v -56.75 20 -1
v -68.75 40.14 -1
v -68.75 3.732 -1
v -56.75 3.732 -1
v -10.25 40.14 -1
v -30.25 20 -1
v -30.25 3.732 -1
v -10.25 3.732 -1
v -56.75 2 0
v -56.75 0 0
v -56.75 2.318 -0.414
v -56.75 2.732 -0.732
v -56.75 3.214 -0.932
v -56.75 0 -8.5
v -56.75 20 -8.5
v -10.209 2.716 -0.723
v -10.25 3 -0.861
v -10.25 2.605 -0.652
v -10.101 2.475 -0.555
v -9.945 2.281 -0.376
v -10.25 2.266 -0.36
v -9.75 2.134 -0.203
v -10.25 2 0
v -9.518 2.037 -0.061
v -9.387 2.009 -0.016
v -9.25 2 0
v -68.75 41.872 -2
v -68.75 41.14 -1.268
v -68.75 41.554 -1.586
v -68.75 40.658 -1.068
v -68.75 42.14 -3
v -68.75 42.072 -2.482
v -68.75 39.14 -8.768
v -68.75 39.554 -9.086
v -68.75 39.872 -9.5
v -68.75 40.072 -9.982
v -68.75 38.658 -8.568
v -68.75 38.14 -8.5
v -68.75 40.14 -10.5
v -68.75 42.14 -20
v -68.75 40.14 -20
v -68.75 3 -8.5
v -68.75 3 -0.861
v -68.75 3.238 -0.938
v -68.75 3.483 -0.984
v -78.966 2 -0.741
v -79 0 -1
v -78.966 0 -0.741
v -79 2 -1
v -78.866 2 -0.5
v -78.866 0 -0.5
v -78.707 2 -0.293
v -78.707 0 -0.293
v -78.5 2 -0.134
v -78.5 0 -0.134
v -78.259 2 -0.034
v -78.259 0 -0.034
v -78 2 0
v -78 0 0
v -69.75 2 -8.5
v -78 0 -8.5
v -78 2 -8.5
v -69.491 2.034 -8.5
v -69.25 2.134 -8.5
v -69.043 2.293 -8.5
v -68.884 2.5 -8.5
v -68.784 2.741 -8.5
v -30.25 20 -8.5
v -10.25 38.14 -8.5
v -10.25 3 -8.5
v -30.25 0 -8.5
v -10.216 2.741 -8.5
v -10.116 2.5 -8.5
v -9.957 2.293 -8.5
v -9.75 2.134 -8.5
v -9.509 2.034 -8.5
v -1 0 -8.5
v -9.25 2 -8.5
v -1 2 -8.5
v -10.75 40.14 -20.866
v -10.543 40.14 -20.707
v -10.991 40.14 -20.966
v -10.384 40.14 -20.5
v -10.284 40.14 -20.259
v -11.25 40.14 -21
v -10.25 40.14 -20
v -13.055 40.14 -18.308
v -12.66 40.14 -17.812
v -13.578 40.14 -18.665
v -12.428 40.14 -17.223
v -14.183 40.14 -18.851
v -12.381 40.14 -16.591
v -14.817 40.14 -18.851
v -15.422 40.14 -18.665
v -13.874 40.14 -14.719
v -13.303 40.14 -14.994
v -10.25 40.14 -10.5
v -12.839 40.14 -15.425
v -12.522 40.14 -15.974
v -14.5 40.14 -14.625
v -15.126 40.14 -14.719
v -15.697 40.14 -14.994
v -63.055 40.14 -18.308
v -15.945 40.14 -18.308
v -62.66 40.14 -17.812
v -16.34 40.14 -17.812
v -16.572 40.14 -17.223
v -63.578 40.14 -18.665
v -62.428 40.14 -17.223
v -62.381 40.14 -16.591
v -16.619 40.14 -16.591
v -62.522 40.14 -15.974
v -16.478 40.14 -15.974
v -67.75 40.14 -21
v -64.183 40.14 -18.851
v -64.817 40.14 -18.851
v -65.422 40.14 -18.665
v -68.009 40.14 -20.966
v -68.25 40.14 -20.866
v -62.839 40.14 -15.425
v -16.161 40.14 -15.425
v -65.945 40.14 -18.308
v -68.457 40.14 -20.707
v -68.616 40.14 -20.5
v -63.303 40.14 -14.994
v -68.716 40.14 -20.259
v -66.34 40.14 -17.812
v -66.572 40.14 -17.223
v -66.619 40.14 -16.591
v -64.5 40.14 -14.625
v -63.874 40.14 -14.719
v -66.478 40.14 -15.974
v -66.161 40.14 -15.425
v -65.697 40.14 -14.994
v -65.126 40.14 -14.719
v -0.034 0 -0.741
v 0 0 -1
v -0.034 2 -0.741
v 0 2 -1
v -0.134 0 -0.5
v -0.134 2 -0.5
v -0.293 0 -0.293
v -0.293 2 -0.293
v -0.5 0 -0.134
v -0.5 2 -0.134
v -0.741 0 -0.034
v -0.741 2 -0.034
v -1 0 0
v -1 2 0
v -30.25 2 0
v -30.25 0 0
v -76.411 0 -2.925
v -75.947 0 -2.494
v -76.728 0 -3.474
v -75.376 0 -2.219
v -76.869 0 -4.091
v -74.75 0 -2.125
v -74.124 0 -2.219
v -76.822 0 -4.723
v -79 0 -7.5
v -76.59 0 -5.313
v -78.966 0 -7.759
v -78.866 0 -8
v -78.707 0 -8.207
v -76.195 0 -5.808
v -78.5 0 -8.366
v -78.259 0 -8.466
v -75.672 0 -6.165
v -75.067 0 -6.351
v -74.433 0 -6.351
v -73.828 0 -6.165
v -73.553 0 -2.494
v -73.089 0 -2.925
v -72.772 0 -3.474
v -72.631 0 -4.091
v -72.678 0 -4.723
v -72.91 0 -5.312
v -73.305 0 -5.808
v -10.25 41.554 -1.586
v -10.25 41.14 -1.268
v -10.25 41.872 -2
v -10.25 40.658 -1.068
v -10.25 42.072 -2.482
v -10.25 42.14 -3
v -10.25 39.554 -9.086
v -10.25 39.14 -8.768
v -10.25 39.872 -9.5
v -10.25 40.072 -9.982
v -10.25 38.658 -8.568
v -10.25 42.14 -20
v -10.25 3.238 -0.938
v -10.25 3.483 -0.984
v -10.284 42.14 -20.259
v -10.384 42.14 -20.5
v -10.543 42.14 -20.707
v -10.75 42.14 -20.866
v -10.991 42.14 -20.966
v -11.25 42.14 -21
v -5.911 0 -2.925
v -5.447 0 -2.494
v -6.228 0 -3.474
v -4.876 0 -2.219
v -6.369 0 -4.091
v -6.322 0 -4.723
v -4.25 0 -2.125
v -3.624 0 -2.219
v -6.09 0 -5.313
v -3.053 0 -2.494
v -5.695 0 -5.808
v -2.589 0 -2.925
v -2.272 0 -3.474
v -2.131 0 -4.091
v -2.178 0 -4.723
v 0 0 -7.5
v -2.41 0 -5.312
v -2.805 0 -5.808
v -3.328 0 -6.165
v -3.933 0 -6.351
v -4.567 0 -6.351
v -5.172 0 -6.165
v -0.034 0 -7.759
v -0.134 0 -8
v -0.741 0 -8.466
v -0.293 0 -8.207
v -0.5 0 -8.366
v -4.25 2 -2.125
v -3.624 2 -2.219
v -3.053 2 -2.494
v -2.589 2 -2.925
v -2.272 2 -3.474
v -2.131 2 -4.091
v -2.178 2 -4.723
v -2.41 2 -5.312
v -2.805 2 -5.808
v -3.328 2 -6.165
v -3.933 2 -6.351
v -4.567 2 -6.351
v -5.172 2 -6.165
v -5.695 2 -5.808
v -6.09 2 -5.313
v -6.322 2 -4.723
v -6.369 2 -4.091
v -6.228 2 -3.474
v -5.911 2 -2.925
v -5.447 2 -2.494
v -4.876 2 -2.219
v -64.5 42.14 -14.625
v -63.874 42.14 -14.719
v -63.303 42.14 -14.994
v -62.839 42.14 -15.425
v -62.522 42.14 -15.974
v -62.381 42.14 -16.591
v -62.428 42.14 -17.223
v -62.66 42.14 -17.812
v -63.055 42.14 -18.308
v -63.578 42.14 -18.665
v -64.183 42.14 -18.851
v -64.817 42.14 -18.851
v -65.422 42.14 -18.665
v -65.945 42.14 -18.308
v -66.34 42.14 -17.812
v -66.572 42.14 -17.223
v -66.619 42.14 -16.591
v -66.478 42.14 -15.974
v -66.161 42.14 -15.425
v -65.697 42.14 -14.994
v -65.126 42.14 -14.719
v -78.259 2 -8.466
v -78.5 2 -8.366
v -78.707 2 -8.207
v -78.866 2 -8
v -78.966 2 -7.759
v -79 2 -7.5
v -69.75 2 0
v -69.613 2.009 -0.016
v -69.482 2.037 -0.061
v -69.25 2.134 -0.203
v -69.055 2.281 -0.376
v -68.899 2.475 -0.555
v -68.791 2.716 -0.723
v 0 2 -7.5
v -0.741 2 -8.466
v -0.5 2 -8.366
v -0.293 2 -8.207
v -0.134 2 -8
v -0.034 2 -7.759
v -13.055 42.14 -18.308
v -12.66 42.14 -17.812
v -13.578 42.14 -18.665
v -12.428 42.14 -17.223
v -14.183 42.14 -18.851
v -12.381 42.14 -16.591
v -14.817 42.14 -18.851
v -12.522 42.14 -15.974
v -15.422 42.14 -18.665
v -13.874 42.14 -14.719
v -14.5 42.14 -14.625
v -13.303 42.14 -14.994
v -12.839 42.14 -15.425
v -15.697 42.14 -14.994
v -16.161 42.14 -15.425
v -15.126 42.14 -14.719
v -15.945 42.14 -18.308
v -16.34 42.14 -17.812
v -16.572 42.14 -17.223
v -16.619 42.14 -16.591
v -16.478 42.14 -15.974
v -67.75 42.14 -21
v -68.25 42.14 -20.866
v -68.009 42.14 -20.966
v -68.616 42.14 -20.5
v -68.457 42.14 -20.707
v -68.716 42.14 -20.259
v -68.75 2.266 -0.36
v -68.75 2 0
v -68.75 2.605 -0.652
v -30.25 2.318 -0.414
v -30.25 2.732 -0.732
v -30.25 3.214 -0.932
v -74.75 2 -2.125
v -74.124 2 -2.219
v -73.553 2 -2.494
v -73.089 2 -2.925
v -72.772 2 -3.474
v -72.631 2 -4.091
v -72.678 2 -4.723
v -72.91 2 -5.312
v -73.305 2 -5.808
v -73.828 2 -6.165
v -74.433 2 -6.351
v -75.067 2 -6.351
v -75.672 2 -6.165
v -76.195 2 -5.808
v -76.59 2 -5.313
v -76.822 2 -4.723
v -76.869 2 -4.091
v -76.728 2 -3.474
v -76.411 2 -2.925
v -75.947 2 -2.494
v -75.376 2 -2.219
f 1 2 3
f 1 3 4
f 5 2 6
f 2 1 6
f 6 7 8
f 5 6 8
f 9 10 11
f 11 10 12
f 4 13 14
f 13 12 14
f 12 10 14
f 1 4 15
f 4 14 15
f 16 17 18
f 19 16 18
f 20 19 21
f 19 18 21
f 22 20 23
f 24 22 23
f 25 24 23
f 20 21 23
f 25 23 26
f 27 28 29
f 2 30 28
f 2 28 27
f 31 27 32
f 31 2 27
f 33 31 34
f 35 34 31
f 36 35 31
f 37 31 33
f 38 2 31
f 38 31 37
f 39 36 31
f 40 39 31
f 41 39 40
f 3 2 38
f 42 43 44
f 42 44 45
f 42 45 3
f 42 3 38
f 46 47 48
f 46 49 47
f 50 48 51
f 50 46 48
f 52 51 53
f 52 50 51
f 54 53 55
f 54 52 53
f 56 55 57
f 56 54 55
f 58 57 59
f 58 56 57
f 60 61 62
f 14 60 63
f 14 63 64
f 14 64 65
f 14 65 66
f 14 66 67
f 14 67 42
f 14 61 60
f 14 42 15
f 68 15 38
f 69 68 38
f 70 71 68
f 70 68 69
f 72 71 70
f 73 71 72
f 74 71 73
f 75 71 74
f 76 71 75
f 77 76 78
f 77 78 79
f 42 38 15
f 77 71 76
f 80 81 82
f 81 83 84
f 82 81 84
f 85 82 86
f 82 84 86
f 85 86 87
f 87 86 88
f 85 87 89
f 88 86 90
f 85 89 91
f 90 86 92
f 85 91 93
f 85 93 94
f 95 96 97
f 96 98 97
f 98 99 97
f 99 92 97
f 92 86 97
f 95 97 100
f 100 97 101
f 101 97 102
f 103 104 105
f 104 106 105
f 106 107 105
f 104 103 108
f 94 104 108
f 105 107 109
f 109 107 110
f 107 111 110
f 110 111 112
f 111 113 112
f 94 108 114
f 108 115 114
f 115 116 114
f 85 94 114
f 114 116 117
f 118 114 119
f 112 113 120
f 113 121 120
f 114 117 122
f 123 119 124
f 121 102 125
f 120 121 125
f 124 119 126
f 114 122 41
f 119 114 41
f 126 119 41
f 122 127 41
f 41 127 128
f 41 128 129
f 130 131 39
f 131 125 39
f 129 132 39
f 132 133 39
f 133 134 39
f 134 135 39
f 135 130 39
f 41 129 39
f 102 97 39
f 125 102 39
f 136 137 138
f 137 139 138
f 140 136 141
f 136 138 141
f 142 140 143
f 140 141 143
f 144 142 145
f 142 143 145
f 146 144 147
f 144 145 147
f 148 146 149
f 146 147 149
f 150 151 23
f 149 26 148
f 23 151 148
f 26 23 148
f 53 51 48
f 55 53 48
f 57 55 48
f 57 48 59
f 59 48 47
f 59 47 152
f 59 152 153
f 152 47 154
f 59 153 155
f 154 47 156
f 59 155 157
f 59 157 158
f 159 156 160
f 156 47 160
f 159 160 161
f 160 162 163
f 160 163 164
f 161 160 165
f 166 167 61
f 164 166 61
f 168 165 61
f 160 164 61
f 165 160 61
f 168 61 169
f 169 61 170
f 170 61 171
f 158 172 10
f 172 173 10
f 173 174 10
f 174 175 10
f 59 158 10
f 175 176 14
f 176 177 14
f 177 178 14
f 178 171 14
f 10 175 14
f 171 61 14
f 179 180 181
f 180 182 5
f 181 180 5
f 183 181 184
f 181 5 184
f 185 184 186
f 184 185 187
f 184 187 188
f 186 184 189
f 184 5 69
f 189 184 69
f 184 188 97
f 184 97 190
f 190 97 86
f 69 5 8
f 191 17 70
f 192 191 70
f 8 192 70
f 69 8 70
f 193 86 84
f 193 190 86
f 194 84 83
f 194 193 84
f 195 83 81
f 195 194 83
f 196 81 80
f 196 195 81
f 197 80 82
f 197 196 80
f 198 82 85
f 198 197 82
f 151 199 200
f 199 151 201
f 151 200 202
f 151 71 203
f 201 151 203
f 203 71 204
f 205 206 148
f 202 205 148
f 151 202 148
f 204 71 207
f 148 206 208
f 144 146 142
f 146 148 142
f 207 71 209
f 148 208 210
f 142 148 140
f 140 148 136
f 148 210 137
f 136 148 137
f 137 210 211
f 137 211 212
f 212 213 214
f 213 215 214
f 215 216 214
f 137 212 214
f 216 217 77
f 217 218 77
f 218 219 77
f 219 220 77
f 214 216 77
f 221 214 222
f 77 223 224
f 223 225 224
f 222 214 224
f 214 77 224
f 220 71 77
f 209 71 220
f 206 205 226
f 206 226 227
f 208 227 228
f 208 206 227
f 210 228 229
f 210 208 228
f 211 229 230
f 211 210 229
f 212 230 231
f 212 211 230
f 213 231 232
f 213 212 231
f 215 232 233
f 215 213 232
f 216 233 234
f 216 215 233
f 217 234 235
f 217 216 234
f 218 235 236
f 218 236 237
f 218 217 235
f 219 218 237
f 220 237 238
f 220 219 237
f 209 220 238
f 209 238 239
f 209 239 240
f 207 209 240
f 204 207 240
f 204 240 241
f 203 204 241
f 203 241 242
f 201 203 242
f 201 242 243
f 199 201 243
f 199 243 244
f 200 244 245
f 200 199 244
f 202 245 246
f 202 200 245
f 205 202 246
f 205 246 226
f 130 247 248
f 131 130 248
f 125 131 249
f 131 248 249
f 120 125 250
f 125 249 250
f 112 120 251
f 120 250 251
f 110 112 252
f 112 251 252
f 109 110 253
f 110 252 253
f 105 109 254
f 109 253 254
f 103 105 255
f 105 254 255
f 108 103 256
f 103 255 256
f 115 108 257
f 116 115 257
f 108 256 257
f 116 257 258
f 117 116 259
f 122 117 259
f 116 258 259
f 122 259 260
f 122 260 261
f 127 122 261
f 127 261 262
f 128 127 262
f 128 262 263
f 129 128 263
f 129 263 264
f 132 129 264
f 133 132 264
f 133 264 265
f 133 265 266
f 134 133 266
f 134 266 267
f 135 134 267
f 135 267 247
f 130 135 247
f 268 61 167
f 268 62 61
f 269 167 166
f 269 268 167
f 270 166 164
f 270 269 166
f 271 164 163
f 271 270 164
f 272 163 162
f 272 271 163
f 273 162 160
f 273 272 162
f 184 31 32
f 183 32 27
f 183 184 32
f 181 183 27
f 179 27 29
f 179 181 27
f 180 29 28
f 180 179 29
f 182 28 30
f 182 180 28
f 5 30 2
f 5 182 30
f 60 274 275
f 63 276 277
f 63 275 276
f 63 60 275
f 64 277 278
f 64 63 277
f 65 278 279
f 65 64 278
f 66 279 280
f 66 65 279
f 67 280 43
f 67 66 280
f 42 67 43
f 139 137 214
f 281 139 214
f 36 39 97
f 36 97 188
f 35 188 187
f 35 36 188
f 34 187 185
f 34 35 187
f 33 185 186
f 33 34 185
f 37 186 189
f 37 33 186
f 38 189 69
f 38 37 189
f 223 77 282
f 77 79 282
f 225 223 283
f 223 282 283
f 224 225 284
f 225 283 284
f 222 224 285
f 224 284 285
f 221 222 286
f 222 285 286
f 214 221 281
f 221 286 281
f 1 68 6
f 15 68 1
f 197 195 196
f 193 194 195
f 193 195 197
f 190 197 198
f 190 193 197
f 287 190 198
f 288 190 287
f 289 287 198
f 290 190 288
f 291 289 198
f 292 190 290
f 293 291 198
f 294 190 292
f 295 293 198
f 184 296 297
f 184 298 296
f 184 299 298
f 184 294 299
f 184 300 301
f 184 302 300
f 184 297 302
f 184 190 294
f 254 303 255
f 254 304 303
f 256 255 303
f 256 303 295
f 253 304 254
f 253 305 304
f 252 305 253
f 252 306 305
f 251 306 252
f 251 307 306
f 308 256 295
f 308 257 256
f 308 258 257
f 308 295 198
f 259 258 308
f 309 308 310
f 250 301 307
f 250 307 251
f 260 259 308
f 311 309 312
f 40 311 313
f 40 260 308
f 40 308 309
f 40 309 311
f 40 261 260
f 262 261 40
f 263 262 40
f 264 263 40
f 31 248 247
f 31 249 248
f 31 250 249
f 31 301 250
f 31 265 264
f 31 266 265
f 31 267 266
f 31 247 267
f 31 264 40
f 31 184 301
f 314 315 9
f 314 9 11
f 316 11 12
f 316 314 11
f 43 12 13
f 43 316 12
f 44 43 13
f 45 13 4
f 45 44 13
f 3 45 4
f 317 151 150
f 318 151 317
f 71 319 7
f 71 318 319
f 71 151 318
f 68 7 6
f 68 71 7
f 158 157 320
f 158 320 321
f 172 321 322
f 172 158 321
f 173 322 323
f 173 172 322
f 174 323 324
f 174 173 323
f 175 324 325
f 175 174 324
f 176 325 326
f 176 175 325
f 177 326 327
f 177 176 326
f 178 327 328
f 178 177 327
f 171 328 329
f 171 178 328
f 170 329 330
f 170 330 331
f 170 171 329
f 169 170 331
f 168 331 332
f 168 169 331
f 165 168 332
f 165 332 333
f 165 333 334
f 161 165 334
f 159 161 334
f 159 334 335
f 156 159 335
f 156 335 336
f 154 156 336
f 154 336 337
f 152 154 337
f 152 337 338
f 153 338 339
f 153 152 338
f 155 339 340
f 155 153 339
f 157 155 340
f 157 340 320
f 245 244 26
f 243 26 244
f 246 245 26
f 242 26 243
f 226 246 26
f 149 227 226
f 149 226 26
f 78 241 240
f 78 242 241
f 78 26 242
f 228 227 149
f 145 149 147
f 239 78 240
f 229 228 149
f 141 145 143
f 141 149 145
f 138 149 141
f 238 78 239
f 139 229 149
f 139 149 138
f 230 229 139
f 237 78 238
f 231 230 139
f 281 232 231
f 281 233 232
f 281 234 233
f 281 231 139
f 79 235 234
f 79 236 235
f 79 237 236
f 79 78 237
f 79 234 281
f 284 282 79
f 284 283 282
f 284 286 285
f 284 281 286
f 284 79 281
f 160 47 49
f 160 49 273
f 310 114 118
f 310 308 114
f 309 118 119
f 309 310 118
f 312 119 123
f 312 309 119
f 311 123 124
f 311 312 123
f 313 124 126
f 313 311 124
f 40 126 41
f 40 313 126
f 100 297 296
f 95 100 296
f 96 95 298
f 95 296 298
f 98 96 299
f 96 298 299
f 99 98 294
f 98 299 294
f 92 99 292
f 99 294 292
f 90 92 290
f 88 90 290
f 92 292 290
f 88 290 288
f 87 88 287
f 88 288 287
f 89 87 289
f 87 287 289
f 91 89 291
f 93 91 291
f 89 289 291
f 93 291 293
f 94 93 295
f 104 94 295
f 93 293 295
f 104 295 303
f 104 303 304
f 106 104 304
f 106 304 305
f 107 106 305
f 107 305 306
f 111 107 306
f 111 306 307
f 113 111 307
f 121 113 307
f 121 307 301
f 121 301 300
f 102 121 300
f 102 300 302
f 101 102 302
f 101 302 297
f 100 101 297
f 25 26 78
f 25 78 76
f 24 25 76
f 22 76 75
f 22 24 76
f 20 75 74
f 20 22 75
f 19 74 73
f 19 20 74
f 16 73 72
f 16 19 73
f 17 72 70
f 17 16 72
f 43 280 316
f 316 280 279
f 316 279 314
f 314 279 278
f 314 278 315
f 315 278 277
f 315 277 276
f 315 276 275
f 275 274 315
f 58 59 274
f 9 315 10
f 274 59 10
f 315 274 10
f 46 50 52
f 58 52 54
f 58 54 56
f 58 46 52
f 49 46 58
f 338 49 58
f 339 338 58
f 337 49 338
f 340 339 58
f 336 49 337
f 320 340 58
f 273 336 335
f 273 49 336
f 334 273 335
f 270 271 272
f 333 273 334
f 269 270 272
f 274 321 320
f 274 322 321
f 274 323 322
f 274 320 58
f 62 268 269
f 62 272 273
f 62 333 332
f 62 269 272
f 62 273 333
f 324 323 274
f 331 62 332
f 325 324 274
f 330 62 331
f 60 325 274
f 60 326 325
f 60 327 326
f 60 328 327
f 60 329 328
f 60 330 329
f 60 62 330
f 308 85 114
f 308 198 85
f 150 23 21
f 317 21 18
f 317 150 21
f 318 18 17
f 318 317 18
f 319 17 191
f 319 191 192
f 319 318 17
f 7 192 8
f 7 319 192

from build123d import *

# Parameters (mm, degrees)
SKETCH1_W           = 79
SKETCH1_H           = 8.5
SKETCH1_R           = 2.125
BOSS_EXTRUDE1_DEPTH = 2
SKETCH3_W           = 58.5
SKETCH3_H           = 7.5
BOSS_EXTRUDE2_DEPTH = 40.14
SKETCH4_W           = 58.5
SKETCH4_H           = 2
BOSS_EXTRUDE3_DEPTH = 12.5
CUT_EXTRUDE1_REACH  = 93.966
SKETCH5_R           = 2.125
FILLET1_R           = 2
FILLET2_R           = 1
FILLET3_R           = 2
FILLET4_R           = 1
FILLET5_R           = 1
SKETCH6_W           = 26.5
SKETCH6_H           = 20
CUT_EXTRUDE2_DEPTH  = 10


with BuildPart() as part:
    # Sketch1 → Boss-Extrude1 (new body)
    with BuildSketch(Plane(origin=(0, 0, 0), x_dir=(1, 0, 0), z_dir=(0, 1, 0))):
        with Locations((-39.5, 4.25)):
            Rectangle(SKETCH1_W, SKETCH1_H)
        with Locations(Location((-74.75, 4.25, 0), (0, 0, 270))):
            Circle(SKETCH1_R, mode=Mode.SUBTRACT)
        with Locations(Location((-4.25, 4.25, 0), (0, 0, 270))):
            Circle(SKETCH1_R, mode=Mode.SUBTRACT)
    extrude(amount=BOSS_EXTRUDE1_DEPTH)

    # Sketch3 → Boss-Extrude2 (add)
    with BuildSketch(Plane(origin=(0, 2, 0), x_dir=(1, 0, 0), z_dir=(0, 1, 0))):
        with Locations((-39.5, 4.75)):
            Rectangle(SKETCH3_W, SKETCH3_H)
    extrude(amount=BOSS_EXTRUDE2_DEPTH)

    # Sketch4 → Boss-Extrude3 (add)
    with BuildSketch(Plane(origin=(0, 0, -8.5), x_dir=(-1, 0, 0), z_dir=(0, 0, -1))):
        with Locations((39.5, 41.14)):
            Rectangle(SKETCH4_W, SKETCH4_H)
    extrude(amount=BOSS_EXTRUDE3_DEPTH)

    # Sketch5 → Cut-Extrude1 (cut, up to next)
    with BuildSketch(Plane(origin=(0, 42.14, 0), x_dir=(1, 0, 0), z_dir=(0, 1, 0)), mode=Mode.PRIVATE) as cut_extrude1_sk1:
        with Locations(Location((-14.5, 16.75, 0), (0, 0, 270))):
            Circle(SKETCH5_R)
    cut_extrude1_tool1 = extrude(cut_extrude1_sk1.sketch, amount=-CUT_EXTRUDE1_REACH, mode=Mode.PRIVATE) & part.part
    # Sketch5 → Cut-Extrude1 (cut, up to next)
    with BuildSketch(Plane(origin=(0, 42.14, 0), x_dir=(1, 0, 0), z_dir=(0, 1, 0)), mode=Mode.PRIVATE) as cut_extrude1_sk2:
        with Locations(Location((-64.5, 16.75, 0), (0, 0, 270))):
            Circle(SKETCH5_R)
    cut_extrude1_tool2 = extrude(cut_extrude1_sk2.sketch, amount=-CUT_EXTRUDE1_REACH, mode=Mode.PRIVATE) & part.part
    add(cut_extrude1_tool1.solids().sort_by_distance((-14.5, 42.14, -16.75))[0], mode=Mode.SUBTRACT)
    add(cut_extrude1_tool2.solids().sort_by_distance((-64.5, 42.14, -16.75))[0], mode=Mode.SUBTRACT)

    # Fillet1
    # the kernel refuses this fillet: 2 mm, written as the material it adds along each edge
    with BuildSketch(Plane(origin=(-68.75, 40.14, -8.5), x_dir=(0, -1, 0), z_dir=(1, 0, 0))) as fillet1_piece_1:
        with BuildLine():
            CenterArc((FILLET1_R, FILLET1_R), FILLET1_R, 180, 90)
            Line((0, FILLET1_R), (-FILLET1_R * 0.02, FILLET1_R))
            Line((-FILLET1_R * 0.02, FILLET1_R), (-FILLET1_R * 0.02, -FILLET1_R * 0.02))
            Line((-FILLET1_R * 0.02, -FILLET1_R * 0.02), (FILLET1_R, -FILLET1_R * 0.02))
            Line((FILLET1_R, -FILLET1_R * 0.02), (FILLET1_R, 0))
        make_face()
    extrude(amount=58.5)
    with BuildSketch(Plane(origin=(-68.75, 2, -1), x_dir=(0, 0, 1), z_dir=(1, 0, 0))) as fillet1_piece_2:
        with BuildLine():
            CenterArc((2, -1.732050808), FILLET1_R, 120, 60)
            Line((0, -1.732050808), (-0.04, -1.732050808))
            Line((-0.04, -1.732050808), (-0.04, 0))
            Line((-0.04, 0), (0, 0.04))
            ThreePointArc((0, 0.04), (0.5, 0.04), (0.98, 0.034641016))
            Line((0.98, 0.034641016), (1, 0))
        make_face()
    extrude(amount=58.5)

    # Fillet2
    fillet2_edges = [part.edges().sort_by_distance(p)[0] for p in [
        (-79, 1, 0),
        (-79, 1, -8.5),
        (-68.75, 41.14, -21),
        (-10.25, 41.14, -21),
        (0, 1, -8.5),
        (0, 1, 0),
    ]]
    fillet(fillet2_edges, radius=FILLET2_R)

    # Fillet3
    fillet3_edges = [part.edges().sort_by_distance(p)[0] for p in [
        (-39.5, 42.14, -1),
    ]]
    fillet(fillet3_edges, radius=FILLET3_R)

    # Fillet4
    # the kernel refuses this fillet: 1 mm, written as the material it adds along each edge
    with BuildSketch(Plane(origin=(-10.25, 2, 0), x_dir=(0, 1, 0), z_dir=(0, 0, -1))) as fillet4_piece_1_section:
        with BuildLine():
            CenterArc((FILLET4_R, FILLET4_R), FILLET4_R, 180, 90)
            Line((0, FILLET4_R), (0, 0))
            Line((0, 0), (FILLET4_R, 0))
        make_face()
    fillet4_piece_1 = extrude(amount=8.5, mode=Mode.PRIVATE)
    fillet4_piece_1 = fillet4_piece_1 - Plane(origin=(-10.019982346, 3.732050808, 1), x_dir=(0, 0, 1), z_dir=(-1, 0, 0)) * Cylinder(2, 21, mode=Mode.PRIVATE)
    add(fillet4_piece_1)

    # Fillet5
    # the kernel refuses this fillet: 1 mm, written as the material it adds along each edge
    with BuildSketch(Plane(origin=(-68.75, 2, -8.5), x_dir=(-1, 0, 0), z_dir=(0, 0, 1))) as fillet5_piece_1_section:
        with BuildLine():
            CenterArc((FILLET5_R, -FILLET5_R), FILLET5_R, 90, 90)
            Line((0, -FILLET5_R), (0, 0))
            Line((0, 0), (FILLET5_R, 0))
        make_face()
    fillet5_piece_1 = extrude(amount=8.5, mode=Mode.PRIVATE)
    fillet5_piece_1 = fillet5_piece_1 - Plane(origin=(-68.980019627, 3.732050808, 1), x_dir=(0, 0, 1), z_dir=(-1, 0, 0)) * Cylinder(2, 21, mode=Mode.PRIVATE)
    add(fillet5_piece_1)

    # Sketch6 → Cut-Extrude2 (cut)
    with BuildSketch(Plane(origin=(0, 0, -8.5), x_dir=(-1, 0, 0), z_dir=(0, 0, -1))):
        with Locations((43.5, 10)):
            Rectangle(SKETCH6_W, SKETCH6_H)
    extrude(amount=-CUT_EXTRUDE2_DEPTH, mode=Mode.SUBTRACT)


solid = part.part
